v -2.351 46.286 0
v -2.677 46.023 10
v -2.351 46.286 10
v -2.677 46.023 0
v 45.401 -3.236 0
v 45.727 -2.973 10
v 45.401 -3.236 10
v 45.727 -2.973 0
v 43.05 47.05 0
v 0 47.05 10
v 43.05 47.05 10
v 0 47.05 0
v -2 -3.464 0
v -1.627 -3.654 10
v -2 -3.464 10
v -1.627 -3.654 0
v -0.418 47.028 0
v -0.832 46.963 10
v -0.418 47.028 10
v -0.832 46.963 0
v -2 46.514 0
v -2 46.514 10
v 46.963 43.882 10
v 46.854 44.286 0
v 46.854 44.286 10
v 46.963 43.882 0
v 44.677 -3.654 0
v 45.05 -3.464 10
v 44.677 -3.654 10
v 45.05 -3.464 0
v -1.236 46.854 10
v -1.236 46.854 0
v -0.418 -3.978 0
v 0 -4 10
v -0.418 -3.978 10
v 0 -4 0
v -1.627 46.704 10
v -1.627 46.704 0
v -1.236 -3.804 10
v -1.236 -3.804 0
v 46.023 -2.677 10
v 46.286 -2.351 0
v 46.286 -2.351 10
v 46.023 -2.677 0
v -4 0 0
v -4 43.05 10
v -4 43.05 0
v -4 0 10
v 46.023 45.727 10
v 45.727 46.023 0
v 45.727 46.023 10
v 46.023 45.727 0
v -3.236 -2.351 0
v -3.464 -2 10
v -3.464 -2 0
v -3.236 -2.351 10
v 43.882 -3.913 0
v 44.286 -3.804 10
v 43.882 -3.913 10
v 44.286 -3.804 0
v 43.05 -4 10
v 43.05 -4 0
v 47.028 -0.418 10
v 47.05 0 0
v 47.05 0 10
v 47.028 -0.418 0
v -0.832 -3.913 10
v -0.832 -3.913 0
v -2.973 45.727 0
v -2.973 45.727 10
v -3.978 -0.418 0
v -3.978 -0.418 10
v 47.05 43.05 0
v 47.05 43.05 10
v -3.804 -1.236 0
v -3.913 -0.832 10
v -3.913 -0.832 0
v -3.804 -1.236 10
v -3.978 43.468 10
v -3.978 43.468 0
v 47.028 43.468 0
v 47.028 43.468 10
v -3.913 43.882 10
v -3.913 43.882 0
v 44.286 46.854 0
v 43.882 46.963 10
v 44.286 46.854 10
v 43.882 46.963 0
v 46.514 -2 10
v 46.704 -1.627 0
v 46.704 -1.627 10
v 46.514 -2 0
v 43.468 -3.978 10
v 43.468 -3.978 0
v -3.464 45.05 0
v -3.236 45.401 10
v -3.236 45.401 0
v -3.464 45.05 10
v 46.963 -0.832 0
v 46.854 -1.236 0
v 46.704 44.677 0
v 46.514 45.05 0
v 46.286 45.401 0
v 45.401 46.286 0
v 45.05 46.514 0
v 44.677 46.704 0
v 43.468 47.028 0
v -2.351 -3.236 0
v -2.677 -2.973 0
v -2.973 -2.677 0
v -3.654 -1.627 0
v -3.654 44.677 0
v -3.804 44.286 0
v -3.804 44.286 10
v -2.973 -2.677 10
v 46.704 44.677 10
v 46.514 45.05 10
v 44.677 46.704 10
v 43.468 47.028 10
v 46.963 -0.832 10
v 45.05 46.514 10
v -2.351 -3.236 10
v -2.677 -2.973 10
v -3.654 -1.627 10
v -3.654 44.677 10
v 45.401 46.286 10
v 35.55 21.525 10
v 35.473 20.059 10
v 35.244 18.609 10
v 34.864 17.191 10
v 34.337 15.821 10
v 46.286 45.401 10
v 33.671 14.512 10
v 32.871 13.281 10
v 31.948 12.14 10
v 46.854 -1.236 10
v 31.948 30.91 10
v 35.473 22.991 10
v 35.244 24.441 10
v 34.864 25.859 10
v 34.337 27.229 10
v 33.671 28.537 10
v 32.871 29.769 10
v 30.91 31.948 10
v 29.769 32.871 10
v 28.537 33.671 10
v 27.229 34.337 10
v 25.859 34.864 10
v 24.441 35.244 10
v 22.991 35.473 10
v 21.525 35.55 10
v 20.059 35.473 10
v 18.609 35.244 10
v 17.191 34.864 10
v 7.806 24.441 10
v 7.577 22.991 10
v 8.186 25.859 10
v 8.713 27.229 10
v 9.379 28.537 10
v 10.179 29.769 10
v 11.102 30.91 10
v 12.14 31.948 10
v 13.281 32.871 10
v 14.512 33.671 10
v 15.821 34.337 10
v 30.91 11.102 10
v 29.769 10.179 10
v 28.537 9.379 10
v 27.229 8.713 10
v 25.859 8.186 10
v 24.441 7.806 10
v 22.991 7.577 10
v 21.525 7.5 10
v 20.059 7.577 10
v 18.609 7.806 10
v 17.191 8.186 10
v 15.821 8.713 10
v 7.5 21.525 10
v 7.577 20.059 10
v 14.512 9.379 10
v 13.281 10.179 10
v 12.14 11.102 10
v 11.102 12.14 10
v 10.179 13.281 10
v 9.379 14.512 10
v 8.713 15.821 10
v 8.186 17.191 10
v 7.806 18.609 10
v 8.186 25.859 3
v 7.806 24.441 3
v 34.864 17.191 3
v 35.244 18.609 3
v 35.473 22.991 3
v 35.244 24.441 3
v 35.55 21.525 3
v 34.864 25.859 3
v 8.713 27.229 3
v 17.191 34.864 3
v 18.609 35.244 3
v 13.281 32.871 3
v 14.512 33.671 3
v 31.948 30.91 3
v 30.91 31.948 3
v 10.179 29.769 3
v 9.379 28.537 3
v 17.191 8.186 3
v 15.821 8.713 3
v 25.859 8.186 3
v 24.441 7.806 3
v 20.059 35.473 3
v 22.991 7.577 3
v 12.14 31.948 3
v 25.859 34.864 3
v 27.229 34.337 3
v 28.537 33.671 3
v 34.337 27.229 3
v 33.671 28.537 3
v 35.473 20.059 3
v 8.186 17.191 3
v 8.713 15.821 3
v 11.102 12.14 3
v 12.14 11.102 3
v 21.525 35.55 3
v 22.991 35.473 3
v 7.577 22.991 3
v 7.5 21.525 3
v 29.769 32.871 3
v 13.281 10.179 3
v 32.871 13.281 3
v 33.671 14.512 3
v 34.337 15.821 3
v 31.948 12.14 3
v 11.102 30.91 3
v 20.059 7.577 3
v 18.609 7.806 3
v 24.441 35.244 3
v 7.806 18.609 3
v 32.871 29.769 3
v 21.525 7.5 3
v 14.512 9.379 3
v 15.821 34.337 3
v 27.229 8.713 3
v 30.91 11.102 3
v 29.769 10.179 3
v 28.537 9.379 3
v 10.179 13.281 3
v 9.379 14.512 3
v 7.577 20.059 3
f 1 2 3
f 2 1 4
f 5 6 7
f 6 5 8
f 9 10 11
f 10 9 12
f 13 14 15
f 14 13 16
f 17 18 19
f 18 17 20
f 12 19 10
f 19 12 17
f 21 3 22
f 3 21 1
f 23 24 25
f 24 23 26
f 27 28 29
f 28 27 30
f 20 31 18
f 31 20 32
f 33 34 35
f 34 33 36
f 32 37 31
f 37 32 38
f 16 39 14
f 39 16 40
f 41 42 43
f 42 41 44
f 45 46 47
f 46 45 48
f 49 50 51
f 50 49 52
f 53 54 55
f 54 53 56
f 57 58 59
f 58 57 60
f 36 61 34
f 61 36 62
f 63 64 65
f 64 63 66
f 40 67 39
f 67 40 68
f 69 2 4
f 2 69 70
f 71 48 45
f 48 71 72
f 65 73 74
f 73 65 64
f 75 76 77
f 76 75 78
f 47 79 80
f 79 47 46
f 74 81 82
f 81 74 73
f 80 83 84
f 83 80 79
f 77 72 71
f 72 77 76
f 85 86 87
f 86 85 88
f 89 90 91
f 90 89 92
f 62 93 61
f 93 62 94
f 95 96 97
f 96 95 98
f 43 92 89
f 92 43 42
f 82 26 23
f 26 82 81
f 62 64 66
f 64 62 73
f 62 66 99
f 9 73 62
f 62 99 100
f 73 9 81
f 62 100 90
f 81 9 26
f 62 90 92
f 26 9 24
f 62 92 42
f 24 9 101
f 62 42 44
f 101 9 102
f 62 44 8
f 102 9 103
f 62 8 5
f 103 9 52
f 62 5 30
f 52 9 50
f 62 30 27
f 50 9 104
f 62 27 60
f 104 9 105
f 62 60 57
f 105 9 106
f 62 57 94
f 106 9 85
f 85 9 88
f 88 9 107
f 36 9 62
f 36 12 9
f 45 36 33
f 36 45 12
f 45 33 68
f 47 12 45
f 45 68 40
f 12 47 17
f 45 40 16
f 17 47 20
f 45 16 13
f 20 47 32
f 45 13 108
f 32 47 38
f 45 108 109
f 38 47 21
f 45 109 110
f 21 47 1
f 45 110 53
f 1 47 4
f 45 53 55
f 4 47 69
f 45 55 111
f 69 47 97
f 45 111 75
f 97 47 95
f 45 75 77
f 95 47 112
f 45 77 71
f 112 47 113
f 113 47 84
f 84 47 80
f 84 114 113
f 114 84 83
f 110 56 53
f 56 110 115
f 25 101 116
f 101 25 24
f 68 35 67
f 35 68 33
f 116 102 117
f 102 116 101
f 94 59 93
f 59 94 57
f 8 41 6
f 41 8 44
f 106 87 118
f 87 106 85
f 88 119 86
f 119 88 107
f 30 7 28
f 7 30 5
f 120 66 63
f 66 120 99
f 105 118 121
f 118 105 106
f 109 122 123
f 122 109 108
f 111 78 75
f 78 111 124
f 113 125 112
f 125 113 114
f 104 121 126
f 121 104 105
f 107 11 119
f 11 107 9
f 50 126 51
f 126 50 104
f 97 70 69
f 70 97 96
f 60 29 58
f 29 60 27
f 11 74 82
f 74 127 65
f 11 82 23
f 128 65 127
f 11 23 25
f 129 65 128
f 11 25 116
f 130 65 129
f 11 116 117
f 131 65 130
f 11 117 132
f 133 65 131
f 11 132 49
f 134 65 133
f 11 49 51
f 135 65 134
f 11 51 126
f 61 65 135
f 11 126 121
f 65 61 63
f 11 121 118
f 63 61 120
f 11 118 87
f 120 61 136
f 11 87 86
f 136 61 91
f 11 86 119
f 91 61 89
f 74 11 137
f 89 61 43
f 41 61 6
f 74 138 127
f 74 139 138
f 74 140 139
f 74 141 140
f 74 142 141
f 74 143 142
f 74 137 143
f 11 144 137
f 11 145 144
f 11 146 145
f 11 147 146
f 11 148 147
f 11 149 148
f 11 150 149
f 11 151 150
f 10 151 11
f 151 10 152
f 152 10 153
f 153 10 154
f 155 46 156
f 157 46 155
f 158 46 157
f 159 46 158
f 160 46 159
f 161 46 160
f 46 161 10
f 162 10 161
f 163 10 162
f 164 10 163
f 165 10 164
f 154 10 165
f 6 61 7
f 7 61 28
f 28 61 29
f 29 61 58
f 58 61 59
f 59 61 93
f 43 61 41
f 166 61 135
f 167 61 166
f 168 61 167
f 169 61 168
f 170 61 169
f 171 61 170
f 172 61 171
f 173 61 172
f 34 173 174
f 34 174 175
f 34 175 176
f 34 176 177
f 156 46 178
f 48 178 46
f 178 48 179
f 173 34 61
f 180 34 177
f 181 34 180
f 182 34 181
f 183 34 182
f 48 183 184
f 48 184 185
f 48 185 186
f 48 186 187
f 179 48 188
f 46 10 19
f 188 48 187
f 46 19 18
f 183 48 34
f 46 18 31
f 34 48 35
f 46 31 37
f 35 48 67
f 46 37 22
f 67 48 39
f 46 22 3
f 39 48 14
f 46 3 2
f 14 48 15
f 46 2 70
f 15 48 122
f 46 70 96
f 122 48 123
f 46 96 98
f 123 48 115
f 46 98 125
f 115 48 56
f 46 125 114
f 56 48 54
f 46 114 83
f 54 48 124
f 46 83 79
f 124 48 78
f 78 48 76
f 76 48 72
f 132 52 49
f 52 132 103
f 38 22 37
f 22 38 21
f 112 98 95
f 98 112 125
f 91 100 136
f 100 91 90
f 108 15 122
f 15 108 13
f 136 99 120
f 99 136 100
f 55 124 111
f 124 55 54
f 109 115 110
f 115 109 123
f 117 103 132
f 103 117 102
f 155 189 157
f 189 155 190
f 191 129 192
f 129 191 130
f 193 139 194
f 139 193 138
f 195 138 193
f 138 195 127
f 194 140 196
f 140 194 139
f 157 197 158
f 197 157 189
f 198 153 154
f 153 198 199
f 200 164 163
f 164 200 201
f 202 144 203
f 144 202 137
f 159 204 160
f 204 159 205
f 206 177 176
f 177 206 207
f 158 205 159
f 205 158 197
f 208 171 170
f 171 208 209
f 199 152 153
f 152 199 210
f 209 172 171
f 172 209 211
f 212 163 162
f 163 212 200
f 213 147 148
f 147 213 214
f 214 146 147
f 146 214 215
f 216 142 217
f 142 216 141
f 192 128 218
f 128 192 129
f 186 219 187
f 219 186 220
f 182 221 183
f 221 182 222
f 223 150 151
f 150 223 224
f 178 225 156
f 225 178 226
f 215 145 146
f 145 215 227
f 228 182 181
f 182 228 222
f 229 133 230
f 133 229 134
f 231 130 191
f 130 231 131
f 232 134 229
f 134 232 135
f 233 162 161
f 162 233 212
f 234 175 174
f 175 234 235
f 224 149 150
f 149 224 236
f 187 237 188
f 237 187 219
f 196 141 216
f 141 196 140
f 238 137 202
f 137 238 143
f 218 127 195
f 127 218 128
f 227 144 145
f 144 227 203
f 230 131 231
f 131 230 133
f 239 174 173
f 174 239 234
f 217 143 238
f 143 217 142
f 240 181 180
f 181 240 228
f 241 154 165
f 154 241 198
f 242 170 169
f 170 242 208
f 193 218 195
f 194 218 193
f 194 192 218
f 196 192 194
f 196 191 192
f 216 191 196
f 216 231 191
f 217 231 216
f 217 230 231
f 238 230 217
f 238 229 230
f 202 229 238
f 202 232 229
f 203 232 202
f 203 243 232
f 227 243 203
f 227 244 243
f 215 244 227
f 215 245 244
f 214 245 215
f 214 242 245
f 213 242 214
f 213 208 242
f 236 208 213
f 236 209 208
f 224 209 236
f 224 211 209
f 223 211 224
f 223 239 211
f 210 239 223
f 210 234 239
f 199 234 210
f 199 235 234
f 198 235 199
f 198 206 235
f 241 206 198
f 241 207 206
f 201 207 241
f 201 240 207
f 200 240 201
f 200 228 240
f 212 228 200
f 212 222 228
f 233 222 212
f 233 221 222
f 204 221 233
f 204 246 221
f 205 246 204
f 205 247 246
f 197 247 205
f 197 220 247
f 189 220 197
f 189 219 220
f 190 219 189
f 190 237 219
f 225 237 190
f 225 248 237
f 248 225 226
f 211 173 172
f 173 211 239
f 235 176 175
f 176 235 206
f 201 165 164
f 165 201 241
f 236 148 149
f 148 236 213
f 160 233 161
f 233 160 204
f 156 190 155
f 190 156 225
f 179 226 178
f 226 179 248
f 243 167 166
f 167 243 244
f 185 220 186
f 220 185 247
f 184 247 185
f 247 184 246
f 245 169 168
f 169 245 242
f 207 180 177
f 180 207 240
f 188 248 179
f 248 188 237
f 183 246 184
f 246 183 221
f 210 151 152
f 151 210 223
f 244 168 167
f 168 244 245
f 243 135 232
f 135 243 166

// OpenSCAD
// file: ../VacuumTubes/holders.scad
module tube_holder(
    rows=1,                //
    cols=1,                //
    socket_diameter=27.75, // 
    socket_padding=5,      // padding around socket
    socket_depth=7,        // how far down the socket should cut into the holder
    height=10,             // height of holder
    edge_padding=2.5,      // extra padding from edge of holder to last socket slot
    fillet = 4             // fillet around holder
) {
    socket_radius = socket_diameter / 2;
    socket_slot = socket_diameter + (socket_padding * 2);
    slot_offset = edge_padding + (socket_slot / 2);

    difference() {
        // create base
        hull() {
            base_x = (rows * socket_slot) + (2 * edge_padding);
            base_y = (cols * socket_slot) + (2 * edge_padding);

            translate([0, 0, 0]) cylinder(r=fillet, h=height);
            translate([base_x, 0, 0]) cylinder(r=fillet, h=height);
            translate([0, base_y, 0]) cylinder(r=fillet, h=height);
            translate([base_x, base_y, 0]) cylinder(r=fillet, h=height);
        }

        // socket holes
        for (i = [0:rows-1]) {
            for (j = [0:cols-1]) {
                socket_x = slot_offset + (i * socket_slot);
                socket_y = slot_offset + (j * socket_slot);

                translate([socket_x, socket_y, height-socket_depth])
                    cylinder(r=socket_radius, h=socket_depth);
            }
        }
    }
}
// main file
include <../VacuumTubes/holders.scad>

// openscad -o temp/holder_single.stl examples/holder_single.scad

$fs = 0.1;
$fn = 60;

socket_tolerance = 0.3;

tube_holder(rows=1, cols=1, socket_diameter=27.75 + socket_tolerance, 
    socket_padding=5, socket_depth=7, height=10, edge_padding=2.5);
